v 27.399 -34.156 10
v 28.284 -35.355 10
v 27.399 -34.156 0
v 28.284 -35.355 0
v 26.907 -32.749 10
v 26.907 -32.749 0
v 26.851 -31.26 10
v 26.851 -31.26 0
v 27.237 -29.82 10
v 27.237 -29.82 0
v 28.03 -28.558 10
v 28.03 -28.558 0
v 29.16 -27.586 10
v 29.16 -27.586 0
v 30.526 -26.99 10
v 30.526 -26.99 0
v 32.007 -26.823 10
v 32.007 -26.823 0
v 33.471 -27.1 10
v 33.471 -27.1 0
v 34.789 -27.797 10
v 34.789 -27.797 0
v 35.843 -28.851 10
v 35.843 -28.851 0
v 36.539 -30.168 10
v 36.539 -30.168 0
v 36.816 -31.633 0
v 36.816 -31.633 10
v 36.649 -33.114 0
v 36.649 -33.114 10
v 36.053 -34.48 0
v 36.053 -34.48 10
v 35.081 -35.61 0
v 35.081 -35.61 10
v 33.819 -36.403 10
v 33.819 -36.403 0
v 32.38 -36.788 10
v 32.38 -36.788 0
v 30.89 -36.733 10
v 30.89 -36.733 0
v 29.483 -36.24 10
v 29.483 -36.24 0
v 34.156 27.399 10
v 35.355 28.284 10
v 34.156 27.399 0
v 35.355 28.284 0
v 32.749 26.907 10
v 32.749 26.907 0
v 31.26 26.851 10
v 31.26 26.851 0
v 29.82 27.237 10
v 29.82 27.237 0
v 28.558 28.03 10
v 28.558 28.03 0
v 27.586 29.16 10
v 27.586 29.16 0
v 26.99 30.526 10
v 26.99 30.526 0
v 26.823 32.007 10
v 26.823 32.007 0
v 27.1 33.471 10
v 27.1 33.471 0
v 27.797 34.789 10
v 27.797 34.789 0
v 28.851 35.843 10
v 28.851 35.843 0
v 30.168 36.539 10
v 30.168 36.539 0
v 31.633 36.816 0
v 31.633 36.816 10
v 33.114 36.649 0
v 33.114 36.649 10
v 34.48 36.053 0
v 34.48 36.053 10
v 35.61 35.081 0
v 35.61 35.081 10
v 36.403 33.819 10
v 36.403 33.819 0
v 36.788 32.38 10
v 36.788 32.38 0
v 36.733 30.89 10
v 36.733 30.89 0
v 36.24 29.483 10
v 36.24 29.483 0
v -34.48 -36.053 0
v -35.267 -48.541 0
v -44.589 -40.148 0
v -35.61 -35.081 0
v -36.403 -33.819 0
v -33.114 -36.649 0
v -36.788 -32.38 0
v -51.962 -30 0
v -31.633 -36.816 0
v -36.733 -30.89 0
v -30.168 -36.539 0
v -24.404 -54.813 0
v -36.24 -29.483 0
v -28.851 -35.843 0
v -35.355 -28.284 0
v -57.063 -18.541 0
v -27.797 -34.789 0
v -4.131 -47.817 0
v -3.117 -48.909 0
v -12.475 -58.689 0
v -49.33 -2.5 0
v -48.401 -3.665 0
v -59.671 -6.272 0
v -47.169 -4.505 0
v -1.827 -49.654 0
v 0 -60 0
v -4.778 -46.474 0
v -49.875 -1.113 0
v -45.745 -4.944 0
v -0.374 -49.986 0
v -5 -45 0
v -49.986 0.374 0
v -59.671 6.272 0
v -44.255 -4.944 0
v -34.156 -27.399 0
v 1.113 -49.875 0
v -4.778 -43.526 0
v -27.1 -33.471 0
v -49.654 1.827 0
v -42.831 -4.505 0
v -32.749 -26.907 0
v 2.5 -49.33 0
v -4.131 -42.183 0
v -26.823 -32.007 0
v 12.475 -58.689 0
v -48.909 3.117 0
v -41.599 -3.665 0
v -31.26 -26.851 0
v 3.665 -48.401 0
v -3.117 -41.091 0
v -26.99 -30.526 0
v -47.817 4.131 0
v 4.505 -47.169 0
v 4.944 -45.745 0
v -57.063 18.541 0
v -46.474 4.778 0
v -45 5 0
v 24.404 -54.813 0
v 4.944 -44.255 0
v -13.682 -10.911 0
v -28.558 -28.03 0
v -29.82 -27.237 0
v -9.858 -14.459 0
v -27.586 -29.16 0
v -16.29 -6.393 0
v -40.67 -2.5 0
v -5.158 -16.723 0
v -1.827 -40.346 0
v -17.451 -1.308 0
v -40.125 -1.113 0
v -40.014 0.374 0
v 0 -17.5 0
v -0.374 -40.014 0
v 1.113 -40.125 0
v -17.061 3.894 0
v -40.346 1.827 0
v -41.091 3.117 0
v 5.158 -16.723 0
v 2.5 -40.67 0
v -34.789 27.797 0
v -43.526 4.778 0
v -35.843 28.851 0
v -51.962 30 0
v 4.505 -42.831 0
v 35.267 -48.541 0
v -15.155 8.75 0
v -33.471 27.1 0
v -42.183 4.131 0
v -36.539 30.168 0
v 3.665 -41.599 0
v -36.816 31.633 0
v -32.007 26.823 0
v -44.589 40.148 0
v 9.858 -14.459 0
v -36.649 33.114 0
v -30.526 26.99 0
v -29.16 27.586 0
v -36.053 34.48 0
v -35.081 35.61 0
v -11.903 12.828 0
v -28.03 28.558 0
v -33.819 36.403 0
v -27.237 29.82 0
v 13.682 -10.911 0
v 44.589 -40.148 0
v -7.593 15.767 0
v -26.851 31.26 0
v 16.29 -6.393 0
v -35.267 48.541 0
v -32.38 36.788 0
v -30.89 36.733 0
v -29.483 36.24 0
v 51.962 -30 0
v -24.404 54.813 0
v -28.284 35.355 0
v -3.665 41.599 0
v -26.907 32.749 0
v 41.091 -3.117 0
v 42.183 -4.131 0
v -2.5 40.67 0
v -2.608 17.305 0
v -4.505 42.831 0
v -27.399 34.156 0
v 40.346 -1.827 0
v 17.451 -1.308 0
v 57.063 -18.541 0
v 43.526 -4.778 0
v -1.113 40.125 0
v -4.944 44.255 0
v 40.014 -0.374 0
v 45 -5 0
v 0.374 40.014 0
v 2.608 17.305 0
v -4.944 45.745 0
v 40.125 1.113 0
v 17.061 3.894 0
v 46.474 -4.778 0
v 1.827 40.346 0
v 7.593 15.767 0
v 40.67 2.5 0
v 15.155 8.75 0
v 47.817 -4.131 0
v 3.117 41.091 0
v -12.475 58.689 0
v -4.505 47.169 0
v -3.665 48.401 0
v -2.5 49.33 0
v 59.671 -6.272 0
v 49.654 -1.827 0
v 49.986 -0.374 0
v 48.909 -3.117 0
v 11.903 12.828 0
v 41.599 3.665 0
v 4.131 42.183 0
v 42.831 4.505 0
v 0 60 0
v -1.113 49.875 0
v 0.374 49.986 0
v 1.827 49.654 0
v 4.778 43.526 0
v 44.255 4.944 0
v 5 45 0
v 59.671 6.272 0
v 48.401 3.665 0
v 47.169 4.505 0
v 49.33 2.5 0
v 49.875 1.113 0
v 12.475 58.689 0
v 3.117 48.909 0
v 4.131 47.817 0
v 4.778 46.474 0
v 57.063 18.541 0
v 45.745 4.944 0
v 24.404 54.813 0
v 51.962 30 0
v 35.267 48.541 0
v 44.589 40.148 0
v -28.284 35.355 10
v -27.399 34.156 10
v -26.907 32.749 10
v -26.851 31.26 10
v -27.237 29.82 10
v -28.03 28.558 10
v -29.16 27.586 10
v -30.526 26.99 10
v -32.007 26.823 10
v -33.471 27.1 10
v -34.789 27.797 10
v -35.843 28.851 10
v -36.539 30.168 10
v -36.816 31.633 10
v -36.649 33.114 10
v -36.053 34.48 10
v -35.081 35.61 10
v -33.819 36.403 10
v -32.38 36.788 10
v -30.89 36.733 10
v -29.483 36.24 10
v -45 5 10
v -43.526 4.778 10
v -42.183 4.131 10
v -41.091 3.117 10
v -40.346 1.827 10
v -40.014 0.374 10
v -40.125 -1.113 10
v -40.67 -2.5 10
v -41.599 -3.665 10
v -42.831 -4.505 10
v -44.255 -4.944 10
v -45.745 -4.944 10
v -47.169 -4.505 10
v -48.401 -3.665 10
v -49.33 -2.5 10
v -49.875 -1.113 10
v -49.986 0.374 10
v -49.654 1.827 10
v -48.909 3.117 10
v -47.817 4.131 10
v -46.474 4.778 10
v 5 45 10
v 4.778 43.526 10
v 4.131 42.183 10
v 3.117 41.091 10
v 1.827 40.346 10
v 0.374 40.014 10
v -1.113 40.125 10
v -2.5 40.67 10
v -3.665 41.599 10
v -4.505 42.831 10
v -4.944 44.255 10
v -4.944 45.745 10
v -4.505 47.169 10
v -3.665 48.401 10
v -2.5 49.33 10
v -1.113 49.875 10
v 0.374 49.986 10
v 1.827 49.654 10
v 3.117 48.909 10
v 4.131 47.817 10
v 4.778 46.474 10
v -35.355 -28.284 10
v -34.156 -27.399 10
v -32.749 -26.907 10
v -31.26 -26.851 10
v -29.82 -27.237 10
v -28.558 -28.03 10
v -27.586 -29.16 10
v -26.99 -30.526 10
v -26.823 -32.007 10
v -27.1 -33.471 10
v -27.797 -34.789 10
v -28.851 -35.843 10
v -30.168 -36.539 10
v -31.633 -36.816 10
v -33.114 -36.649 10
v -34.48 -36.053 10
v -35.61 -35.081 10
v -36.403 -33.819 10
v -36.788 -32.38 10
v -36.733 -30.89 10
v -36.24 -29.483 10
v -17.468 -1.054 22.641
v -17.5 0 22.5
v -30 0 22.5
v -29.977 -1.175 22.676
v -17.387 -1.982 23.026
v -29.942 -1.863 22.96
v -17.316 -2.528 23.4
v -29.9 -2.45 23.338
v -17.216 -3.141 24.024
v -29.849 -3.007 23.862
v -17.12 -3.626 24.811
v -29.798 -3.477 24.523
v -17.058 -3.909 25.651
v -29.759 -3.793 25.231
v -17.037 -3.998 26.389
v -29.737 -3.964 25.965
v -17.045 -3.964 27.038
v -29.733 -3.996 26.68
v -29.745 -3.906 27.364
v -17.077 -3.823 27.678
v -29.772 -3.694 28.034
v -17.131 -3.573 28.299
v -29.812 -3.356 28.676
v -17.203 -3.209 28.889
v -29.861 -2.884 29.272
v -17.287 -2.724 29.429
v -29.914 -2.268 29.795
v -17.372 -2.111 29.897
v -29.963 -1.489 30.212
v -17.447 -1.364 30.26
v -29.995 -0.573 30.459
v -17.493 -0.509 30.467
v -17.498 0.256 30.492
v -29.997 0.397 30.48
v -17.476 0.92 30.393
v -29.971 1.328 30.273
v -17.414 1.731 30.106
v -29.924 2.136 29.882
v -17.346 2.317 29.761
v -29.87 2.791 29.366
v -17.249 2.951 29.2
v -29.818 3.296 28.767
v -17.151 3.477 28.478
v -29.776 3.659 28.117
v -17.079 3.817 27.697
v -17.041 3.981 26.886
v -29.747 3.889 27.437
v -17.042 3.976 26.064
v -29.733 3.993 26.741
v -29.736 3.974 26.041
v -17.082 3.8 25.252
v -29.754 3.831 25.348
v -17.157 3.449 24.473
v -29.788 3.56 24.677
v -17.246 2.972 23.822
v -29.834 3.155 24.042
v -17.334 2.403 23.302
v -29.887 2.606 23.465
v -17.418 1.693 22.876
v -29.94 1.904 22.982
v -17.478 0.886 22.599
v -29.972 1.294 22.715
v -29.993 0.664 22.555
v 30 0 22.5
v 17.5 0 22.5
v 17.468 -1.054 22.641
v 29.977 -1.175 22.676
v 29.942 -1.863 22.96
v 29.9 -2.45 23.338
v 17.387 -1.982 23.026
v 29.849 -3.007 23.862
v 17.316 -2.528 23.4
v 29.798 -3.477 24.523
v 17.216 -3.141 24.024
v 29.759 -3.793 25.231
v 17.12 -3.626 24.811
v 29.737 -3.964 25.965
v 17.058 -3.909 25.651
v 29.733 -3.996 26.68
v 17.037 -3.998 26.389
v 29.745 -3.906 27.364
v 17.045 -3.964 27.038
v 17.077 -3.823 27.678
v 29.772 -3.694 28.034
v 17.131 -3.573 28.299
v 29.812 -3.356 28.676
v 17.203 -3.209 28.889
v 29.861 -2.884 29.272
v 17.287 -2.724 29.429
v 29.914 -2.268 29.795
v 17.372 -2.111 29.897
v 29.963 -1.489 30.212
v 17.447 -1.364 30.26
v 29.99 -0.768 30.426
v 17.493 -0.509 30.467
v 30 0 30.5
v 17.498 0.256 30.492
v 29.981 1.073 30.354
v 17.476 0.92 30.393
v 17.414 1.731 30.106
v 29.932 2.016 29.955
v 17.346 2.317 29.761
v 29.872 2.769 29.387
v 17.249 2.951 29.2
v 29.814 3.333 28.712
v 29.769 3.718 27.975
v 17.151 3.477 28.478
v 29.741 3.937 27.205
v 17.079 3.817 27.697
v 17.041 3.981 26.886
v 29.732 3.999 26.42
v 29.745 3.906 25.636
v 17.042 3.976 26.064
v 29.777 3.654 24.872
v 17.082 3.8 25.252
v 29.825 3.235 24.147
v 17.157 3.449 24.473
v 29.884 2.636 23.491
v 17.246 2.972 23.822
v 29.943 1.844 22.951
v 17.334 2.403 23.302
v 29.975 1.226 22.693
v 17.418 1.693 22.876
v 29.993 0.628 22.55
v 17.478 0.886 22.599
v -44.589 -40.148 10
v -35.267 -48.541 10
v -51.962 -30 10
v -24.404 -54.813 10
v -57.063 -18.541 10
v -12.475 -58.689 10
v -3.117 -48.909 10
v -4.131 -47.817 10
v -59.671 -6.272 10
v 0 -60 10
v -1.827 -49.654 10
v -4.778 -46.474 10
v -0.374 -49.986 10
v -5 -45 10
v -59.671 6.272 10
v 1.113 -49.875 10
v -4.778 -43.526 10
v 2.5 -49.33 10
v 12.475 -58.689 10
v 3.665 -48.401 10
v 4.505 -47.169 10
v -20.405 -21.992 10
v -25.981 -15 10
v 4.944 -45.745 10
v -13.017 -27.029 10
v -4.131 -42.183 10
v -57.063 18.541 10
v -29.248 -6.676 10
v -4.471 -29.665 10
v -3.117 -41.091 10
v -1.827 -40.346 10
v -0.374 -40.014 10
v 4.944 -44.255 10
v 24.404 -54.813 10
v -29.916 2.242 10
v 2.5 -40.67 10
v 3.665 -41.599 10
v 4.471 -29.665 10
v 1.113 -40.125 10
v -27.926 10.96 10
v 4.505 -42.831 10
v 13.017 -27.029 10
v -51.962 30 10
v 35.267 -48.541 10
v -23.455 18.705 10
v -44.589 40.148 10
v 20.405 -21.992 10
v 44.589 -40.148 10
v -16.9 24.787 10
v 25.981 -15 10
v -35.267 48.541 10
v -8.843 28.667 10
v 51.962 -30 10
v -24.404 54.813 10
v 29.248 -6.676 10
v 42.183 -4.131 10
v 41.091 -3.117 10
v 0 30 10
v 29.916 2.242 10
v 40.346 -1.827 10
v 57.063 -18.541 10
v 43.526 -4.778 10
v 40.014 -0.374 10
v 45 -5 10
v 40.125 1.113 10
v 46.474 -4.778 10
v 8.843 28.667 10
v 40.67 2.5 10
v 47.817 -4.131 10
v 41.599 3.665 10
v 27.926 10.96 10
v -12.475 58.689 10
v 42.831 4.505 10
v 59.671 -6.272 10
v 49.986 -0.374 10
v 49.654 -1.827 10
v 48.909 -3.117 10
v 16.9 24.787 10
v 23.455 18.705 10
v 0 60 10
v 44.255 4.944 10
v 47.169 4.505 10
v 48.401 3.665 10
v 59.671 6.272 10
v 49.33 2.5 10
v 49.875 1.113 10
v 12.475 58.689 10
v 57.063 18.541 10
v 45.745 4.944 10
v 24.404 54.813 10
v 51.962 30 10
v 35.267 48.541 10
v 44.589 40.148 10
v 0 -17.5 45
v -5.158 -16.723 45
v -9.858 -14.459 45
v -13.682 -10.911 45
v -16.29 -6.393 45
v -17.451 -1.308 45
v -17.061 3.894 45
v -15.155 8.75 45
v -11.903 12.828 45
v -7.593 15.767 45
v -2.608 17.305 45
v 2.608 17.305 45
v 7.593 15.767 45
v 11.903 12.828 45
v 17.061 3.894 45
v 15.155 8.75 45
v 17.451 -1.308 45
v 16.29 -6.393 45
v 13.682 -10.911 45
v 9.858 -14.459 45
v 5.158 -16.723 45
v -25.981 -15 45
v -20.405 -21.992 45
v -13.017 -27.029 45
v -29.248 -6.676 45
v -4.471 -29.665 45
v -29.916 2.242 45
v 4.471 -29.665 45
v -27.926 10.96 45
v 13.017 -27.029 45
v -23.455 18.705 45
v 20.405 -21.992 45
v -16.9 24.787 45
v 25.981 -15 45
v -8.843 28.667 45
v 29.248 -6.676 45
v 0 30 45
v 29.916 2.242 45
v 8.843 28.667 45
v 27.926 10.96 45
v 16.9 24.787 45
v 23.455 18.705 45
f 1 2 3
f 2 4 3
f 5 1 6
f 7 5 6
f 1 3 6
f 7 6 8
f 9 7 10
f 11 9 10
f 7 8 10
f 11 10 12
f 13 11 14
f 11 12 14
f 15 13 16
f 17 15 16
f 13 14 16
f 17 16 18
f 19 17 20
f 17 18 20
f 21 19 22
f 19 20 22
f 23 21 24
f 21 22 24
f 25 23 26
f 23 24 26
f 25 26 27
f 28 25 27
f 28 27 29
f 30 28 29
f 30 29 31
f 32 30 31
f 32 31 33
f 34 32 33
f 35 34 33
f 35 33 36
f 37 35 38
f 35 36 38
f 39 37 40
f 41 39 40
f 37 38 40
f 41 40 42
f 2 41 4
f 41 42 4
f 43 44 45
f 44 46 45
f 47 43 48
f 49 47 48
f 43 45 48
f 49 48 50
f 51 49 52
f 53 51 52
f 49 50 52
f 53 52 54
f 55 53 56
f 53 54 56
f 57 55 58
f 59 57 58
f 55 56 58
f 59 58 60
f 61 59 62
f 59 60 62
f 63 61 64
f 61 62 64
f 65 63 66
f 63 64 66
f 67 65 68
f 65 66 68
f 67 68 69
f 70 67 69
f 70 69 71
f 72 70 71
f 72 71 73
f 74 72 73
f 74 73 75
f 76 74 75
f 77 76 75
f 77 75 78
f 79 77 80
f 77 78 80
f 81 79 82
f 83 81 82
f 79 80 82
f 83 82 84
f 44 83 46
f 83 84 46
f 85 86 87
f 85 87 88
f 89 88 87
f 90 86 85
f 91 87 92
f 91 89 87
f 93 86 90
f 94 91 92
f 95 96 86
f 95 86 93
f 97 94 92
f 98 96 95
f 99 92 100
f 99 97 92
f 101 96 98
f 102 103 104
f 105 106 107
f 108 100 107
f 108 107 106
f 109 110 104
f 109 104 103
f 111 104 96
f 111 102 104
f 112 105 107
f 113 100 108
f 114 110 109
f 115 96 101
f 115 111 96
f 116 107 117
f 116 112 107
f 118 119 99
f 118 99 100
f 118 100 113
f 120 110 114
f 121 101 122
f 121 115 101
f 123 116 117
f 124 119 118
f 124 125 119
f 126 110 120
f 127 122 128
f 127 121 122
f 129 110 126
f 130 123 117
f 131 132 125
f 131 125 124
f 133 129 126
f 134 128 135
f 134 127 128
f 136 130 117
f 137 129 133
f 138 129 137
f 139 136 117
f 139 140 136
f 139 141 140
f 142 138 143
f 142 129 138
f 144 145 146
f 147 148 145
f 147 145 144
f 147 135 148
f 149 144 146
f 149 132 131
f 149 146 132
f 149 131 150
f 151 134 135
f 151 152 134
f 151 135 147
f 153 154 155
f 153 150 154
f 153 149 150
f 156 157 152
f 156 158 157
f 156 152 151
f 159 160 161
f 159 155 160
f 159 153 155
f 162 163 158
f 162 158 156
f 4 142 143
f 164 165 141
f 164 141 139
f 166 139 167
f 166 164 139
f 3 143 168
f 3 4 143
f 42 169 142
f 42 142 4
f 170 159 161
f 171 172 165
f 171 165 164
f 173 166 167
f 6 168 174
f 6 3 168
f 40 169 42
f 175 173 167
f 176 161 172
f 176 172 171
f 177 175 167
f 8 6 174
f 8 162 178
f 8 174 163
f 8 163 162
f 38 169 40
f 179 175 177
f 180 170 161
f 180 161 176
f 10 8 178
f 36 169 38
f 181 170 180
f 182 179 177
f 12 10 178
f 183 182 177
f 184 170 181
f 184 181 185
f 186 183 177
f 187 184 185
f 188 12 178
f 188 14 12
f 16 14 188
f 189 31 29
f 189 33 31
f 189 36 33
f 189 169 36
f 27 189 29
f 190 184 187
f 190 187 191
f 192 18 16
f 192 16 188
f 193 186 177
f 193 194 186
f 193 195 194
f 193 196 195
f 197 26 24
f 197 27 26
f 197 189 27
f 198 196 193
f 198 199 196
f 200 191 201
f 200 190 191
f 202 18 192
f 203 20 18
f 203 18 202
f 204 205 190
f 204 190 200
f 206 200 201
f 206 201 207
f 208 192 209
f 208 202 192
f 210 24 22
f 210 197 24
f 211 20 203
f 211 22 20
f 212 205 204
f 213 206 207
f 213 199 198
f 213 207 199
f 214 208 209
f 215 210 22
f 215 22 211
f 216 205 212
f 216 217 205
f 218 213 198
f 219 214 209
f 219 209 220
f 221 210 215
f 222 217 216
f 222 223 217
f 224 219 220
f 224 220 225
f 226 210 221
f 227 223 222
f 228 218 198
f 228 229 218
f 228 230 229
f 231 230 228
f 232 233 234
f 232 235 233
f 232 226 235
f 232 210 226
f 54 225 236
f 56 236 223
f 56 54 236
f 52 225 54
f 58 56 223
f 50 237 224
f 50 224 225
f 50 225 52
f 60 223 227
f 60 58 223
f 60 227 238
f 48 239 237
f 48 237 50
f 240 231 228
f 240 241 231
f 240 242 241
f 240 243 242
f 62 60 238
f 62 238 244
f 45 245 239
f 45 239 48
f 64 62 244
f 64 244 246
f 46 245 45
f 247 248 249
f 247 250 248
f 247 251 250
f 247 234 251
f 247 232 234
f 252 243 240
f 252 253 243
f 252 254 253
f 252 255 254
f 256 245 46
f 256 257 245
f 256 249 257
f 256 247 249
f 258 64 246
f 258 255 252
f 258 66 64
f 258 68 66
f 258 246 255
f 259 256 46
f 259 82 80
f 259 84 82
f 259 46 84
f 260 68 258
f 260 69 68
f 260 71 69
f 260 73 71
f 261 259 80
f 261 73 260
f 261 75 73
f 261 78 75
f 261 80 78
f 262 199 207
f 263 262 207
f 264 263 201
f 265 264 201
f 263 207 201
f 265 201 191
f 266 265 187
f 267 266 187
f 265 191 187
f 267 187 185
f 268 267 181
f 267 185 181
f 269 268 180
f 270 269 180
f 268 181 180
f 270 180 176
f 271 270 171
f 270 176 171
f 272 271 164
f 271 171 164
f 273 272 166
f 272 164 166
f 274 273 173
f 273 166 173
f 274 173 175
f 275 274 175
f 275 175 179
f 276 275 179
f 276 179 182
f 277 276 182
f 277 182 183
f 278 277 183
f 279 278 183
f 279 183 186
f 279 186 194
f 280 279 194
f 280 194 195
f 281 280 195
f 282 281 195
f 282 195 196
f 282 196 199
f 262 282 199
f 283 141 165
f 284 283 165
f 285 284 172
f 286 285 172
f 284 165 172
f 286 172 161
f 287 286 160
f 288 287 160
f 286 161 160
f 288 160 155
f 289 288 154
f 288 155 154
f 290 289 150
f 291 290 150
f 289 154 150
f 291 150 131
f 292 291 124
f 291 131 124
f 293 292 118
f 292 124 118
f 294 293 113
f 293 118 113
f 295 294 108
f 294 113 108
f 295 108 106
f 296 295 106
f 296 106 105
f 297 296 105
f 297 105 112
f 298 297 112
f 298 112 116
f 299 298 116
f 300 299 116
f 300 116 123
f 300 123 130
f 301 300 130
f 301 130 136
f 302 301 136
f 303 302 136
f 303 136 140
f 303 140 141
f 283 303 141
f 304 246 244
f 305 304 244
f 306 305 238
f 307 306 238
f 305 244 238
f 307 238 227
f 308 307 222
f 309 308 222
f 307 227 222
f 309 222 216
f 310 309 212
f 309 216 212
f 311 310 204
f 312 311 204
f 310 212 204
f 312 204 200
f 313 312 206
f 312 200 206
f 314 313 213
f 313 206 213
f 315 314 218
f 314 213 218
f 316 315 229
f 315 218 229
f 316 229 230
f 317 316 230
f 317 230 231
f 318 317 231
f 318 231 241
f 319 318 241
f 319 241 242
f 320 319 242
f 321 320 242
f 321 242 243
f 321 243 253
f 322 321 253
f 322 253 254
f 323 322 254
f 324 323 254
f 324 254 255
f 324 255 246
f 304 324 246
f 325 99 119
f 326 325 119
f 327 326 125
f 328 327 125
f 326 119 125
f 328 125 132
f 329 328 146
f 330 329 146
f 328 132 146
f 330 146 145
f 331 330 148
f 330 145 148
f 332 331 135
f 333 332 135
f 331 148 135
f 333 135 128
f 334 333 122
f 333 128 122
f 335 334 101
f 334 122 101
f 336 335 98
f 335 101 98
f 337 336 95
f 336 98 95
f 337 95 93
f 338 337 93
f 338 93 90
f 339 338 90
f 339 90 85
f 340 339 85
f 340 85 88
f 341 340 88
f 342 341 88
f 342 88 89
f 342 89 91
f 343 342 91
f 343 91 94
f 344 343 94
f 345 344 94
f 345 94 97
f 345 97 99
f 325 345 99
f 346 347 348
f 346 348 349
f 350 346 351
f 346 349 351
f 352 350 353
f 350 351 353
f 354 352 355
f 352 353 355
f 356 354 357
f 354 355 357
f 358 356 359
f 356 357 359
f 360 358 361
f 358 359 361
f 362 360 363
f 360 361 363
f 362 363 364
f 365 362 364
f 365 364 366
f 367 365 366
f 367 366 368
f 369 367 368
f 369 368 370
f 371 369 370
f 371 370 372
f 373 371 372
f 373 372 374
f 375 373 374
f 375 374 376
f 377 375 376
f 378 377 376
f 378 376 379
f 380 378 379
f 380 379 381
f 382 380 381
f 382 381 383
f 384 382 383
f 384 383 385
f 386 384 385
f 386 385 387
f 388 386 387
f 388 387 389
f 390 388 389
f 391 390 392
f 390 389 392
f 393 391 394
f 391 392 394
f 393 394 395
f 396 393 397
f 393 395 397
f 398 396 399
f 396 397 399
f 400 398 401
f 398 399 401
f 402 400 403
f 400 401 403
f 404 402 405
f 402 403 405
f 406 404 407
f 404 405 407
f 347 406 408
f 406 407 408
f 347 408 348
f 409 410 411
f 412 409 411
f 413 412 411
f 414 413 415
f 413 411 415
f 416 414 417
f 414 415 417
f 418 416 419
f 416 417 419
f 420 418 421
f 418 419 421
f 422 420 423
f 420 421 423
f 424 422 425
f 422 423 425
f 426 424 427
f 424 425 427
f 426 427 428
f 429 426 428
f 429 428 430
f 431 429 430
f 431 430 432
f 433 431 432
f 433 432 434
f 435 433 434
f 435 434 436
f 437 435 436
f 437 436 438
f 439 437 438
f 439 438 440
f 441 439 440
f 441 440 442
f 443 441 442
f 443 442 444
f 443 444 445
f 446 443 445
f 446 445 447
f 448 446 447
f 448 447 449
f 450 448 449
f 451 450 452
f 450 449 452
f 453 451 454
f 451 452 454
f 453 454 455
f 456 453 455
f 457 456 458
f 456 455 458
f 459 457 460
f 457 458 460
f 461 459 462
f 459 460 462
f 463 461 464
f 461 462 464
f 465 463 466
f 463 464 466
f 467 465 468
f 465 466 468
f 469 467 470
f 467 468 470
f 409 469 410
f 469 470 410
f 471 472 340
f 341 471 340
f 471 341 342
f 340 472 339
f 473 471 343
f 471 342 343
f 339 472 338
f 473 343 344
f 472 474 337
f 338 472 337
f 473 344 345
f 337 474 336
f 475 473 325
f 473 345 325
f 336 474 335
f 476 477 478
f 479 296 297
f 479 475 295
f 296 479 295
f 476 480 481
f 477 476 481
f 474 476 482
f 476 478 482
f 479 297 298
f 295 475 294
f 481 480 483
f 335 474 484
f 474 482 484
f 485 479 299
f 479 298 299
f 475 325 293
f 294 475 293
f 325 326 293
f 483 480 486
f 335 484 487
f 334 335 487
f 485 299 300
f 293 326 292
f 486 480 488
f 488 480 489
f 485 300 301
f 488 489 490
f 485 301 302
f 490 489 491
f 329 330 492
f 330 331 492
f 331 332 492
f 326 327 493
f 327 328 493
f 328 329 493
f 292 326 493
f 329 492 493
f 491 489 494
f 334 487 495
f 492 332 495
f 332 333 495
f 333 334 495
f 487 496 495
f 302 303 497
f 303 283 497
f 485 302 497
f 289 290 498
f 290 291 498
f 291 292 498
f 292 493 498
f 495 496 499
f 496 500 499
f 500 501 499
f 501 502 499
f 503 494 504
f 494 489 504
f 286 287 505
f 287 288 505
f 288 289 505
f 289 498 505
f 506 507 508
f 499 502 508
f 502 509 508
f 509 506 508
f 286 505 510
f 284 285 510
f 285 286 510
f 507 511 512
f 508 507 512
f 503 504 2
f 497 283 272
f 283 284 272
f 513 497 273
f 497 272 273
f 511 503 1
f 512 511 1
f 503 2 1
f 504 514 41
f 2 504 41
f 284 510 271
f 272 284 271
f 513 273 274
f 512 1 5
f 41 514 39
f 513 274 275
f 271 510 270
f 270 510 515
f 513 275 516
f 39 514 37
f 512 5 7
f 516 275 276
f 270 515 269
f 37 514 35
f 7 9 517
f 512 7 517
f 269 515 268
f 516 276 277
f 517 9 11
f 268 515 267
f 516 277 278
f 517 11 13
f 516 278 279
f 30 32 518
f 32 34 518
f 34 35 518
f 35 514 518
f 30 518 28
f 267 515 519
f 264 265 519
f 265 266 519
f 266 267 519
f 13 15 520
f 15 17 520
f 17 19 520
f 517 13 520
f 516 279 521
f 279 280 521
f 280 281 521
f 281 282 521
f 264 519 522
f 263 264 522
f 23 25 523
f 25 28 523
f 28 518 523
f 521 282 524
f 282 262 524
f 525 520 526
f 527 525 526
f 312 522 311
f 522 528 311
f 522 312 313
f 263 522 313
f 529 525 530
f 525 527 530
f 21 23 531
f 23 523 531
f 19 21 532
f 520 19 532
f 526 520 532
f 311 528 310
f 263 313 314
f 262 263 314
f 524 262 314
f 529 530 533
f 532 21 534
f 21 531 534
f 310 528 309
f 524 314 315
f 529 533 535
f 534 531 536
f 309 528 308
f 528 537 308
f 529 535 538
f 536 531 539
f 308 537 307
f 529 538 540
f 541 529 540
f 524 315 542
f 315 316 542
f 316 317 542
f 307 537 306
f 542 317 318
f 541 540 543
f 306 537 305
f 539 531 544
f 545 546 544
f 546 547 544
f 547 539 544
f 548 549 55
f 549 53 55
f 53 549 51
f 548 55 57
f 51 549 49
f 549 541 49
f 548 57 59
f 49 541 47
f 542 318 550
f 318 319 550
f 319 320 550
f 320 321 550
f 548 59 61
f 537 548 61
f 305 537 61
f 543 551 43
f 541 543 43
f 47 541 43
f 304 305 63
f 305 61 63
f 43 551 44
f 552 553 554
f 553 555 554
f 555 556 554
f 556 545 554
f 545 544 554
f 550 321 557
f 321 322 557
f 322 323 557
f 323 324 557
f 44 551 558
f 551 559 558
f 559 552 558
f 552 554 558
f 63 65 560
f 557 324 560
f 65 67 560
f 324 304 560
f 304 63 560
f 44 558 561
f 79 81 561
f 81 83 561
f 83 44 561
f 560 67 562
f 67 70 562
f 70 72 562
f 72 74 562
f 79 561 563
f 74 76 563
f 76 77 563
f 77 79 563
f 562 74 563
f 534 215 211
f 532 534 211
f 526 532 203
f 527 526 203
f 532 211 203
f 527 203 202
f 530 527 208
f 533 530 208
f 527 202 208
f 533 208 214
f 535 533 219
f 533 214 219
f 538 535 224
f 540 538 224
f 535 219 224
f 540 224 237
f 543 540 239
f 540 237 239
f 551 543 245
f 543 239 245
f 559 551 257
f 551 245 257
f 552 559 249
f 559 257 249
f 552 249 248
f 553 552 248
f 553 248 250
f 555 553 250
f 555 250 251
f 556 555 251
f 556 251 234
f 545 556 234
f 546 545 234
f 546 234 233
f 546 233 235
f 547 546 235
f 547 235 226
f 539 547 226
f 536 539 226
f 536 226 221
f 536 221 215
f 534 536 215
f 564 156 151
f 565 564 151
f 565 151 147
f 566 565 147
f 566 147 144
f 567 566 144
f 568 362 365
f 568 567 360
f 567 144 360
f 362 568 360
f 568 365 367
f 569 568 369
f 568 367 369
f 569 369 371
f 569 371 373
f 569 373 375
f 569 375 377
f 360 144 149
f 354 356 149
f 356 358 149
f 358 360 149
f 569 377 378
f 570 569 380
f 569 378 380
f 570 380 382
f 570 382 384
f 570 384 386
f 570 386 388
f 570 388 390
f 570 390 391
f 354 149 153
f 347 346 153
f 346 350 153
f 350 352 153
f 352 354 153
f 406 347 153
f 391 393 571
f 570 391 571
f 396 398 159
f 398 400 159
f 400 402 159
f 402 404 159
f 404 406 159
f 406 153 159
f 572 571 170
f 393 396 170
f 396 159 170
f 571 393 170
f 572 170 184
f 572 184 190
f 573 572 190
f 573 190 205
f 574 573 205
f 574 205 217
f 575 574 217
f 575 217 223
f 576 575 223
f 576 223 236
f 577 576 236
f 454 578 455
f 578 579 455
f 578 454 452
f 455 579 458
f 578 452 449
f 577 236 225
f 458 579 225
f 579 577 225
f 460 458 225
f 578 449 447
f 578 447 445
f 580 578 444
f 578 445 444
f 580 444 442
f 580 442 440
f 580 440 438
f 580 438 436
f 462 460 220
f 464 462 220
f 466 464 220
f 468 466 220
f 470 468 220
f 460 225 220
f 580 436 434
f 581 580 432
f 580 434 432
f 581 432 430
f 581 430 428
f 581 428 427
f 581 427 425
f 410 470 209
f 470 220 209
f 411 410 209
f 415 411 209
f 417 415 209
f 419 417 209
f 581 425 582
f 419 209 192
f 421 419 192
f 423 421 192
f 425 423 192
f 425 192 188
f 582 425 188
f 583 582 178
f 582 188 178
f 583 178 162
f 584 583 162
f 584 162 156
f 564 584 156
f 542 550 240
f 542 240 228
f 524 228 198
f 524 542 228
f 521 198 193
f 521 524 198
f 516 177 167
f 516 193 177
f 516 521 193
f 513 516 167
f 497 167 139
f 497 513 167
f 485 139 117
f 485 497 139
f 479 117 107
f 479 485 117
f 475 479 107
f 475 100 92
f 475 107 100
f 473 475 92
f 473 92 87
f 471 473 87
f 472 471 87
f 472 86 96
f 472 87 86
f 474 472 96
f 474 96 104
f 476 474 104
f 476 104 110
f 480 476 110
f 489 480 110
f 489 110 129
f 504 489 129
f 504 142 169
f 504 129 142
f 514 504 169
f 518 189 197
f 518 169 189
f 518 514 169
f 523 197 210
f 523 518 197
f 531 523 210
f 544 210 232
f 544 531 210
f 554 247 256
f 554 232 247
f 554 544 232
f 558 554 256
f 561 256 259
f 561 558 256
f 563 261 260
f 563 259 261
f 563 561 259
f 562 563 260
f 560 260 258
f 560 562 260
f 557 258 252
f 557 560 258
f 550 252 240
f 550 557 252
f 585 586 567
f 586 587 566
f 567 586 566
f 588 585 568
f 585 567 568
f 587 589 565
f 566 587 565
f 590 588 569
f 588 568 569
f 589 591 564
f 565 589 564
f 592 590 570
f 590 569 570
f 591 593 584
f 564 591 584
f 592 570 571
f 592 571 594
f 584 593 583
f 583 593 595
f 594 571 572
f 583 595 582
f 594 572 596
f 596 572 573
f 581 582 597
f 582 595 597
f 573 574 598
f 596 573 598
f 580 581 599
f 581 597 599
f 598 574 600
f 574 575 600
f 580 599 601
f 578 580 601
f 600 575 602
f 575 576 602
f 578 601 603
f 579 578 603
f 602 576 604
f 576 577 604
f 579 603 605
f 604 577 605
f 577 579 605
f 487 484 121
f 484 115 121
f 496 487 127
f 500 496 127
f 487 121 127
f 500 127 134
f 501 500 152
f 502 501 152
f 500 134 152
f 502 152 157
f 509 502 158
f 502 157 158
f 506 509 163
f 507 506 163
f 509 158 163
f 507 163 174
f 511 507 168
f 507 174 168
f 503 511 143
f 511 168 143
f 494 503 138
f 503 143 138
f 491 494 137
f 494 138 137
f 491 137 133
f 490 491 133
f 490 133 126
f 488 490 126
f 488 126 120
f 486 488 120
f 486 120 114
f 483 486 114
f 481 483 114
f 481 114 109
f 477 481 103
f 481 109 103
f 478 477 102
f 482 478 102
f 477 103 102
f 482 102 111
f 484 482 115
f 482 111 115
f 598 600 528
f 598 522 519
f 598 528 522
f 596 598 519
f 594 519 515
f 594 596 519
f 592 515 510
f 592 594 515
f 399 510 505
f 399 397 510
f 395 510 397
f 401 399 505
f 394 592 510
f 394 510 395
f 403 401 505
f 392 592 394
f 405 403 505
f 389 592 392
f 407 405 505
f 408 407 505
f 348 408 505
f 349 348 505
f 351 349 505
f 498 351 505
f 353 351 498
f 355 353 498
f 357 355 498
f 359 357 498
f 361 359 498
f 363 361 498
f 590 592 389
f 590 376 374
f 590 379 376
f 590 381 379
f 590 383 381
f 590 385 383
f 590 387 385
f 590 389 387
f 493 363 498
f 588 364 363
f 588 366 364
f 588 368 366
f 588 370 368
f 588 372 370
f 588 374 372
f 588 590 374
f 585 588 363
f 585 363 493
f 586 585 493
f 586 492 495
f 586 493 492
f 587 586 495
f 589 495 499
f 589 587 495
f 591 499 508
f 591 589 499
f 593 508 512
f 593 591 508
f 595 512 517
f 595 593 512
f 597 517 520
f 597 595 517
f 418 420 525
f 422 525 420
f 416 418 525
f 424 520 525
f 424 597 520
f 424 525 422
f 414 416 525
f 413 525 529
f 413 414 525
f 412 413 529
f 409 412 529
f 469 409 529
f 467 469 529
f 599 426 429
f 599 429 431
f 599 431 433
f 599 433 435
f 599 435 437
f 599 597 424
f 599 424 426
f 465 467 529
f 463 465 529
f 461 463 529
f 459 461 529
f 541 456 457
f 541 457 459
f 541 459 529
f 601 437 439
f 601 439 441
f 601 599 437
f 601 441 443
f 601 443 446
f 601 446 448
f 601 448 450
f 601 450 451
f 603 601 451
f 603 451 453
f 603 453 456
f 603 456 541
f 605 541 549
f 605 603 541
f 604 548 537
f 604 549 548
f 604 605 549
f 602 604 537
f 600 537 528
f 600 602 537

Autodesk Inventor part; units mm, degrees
ref_plane "YZ Plane" through (0, 0, 0) normal (1, 0, 0) x (0, 1, 0)
ref_plane "XZ Plane" through (0, 0, 0) normal (0, 1, 0) x (-1, 0, 0)
sketch "Sketch2" plane through (0, 0, 0) normal (1, 0, 0) x (0, 1, 0)
  line L0 (0, 58.5) -> (0, -4.5) projected
  line L1 (-6, 0) -> (78, 0) projected
  line L2 (60, 0) -> (60, 10)
  line L3 (60, 10) -> (30, 10)
  line L4 (30, 10) -> (30, 45)
  line L5 (30, 45) -> (0, 45)
  line L6 (0, 0) -> (60, 0)
  line L7 (0, 45) -> (0, 0)
  dimension "d0" = 60
  dimension "d1" = 30
  dimension "d2" = 10
  dimension "d3" = 35
revolve "Revolution1" add sketch "Sketch2" angle 360 about axis through (0, 0, 0) along (0, 0, -1)
hole "Hole1" at (0, 0, 45) direction (0, 0, -1) diameter 35 end through all
sketch "Sketch3" plane through (0, 0, 10) normal (0, 0, 1) x (1, 0, 0)
  line L0 (-72, 0) -> (96, 0) projected
  line L1 (0, 96) -> (0, -72) projected
  point P0 (45, 0)
  dimension "d14" = 45
hole "Hole2" at (45, 0, 10) direction (0, 0, -1) diameter 10 end through all
pattern_circular "Circular Pattern1" count 8 over 360 about axis through (0, 0, -10) along (0, 0, 1) of "Hole2"
ref_plane "Work Plane1" through (30, 0, 45) normal (1, 0, 0) x (0, 0, -1)
sketch "Sketch4" plane through (30, 0, 45) normal (1, 0, 0) x (0, 0, -1)
  line L0 (-13.5, 0) -> (49.5, 0) projected
  line L1 (45, -72) -> (45, 96) projected
  line L2 (45, -60) -> (45, 60) projected
  line L3 (0, -30) -> (0, 30) projected
  point P0 (18.5, 0)
  dimension "d26" = 18.5
hole "Hole3" at (30, 0, 26.5) direction (-1, 0, 0) diameter 8 end through all
properties part number "hub"
